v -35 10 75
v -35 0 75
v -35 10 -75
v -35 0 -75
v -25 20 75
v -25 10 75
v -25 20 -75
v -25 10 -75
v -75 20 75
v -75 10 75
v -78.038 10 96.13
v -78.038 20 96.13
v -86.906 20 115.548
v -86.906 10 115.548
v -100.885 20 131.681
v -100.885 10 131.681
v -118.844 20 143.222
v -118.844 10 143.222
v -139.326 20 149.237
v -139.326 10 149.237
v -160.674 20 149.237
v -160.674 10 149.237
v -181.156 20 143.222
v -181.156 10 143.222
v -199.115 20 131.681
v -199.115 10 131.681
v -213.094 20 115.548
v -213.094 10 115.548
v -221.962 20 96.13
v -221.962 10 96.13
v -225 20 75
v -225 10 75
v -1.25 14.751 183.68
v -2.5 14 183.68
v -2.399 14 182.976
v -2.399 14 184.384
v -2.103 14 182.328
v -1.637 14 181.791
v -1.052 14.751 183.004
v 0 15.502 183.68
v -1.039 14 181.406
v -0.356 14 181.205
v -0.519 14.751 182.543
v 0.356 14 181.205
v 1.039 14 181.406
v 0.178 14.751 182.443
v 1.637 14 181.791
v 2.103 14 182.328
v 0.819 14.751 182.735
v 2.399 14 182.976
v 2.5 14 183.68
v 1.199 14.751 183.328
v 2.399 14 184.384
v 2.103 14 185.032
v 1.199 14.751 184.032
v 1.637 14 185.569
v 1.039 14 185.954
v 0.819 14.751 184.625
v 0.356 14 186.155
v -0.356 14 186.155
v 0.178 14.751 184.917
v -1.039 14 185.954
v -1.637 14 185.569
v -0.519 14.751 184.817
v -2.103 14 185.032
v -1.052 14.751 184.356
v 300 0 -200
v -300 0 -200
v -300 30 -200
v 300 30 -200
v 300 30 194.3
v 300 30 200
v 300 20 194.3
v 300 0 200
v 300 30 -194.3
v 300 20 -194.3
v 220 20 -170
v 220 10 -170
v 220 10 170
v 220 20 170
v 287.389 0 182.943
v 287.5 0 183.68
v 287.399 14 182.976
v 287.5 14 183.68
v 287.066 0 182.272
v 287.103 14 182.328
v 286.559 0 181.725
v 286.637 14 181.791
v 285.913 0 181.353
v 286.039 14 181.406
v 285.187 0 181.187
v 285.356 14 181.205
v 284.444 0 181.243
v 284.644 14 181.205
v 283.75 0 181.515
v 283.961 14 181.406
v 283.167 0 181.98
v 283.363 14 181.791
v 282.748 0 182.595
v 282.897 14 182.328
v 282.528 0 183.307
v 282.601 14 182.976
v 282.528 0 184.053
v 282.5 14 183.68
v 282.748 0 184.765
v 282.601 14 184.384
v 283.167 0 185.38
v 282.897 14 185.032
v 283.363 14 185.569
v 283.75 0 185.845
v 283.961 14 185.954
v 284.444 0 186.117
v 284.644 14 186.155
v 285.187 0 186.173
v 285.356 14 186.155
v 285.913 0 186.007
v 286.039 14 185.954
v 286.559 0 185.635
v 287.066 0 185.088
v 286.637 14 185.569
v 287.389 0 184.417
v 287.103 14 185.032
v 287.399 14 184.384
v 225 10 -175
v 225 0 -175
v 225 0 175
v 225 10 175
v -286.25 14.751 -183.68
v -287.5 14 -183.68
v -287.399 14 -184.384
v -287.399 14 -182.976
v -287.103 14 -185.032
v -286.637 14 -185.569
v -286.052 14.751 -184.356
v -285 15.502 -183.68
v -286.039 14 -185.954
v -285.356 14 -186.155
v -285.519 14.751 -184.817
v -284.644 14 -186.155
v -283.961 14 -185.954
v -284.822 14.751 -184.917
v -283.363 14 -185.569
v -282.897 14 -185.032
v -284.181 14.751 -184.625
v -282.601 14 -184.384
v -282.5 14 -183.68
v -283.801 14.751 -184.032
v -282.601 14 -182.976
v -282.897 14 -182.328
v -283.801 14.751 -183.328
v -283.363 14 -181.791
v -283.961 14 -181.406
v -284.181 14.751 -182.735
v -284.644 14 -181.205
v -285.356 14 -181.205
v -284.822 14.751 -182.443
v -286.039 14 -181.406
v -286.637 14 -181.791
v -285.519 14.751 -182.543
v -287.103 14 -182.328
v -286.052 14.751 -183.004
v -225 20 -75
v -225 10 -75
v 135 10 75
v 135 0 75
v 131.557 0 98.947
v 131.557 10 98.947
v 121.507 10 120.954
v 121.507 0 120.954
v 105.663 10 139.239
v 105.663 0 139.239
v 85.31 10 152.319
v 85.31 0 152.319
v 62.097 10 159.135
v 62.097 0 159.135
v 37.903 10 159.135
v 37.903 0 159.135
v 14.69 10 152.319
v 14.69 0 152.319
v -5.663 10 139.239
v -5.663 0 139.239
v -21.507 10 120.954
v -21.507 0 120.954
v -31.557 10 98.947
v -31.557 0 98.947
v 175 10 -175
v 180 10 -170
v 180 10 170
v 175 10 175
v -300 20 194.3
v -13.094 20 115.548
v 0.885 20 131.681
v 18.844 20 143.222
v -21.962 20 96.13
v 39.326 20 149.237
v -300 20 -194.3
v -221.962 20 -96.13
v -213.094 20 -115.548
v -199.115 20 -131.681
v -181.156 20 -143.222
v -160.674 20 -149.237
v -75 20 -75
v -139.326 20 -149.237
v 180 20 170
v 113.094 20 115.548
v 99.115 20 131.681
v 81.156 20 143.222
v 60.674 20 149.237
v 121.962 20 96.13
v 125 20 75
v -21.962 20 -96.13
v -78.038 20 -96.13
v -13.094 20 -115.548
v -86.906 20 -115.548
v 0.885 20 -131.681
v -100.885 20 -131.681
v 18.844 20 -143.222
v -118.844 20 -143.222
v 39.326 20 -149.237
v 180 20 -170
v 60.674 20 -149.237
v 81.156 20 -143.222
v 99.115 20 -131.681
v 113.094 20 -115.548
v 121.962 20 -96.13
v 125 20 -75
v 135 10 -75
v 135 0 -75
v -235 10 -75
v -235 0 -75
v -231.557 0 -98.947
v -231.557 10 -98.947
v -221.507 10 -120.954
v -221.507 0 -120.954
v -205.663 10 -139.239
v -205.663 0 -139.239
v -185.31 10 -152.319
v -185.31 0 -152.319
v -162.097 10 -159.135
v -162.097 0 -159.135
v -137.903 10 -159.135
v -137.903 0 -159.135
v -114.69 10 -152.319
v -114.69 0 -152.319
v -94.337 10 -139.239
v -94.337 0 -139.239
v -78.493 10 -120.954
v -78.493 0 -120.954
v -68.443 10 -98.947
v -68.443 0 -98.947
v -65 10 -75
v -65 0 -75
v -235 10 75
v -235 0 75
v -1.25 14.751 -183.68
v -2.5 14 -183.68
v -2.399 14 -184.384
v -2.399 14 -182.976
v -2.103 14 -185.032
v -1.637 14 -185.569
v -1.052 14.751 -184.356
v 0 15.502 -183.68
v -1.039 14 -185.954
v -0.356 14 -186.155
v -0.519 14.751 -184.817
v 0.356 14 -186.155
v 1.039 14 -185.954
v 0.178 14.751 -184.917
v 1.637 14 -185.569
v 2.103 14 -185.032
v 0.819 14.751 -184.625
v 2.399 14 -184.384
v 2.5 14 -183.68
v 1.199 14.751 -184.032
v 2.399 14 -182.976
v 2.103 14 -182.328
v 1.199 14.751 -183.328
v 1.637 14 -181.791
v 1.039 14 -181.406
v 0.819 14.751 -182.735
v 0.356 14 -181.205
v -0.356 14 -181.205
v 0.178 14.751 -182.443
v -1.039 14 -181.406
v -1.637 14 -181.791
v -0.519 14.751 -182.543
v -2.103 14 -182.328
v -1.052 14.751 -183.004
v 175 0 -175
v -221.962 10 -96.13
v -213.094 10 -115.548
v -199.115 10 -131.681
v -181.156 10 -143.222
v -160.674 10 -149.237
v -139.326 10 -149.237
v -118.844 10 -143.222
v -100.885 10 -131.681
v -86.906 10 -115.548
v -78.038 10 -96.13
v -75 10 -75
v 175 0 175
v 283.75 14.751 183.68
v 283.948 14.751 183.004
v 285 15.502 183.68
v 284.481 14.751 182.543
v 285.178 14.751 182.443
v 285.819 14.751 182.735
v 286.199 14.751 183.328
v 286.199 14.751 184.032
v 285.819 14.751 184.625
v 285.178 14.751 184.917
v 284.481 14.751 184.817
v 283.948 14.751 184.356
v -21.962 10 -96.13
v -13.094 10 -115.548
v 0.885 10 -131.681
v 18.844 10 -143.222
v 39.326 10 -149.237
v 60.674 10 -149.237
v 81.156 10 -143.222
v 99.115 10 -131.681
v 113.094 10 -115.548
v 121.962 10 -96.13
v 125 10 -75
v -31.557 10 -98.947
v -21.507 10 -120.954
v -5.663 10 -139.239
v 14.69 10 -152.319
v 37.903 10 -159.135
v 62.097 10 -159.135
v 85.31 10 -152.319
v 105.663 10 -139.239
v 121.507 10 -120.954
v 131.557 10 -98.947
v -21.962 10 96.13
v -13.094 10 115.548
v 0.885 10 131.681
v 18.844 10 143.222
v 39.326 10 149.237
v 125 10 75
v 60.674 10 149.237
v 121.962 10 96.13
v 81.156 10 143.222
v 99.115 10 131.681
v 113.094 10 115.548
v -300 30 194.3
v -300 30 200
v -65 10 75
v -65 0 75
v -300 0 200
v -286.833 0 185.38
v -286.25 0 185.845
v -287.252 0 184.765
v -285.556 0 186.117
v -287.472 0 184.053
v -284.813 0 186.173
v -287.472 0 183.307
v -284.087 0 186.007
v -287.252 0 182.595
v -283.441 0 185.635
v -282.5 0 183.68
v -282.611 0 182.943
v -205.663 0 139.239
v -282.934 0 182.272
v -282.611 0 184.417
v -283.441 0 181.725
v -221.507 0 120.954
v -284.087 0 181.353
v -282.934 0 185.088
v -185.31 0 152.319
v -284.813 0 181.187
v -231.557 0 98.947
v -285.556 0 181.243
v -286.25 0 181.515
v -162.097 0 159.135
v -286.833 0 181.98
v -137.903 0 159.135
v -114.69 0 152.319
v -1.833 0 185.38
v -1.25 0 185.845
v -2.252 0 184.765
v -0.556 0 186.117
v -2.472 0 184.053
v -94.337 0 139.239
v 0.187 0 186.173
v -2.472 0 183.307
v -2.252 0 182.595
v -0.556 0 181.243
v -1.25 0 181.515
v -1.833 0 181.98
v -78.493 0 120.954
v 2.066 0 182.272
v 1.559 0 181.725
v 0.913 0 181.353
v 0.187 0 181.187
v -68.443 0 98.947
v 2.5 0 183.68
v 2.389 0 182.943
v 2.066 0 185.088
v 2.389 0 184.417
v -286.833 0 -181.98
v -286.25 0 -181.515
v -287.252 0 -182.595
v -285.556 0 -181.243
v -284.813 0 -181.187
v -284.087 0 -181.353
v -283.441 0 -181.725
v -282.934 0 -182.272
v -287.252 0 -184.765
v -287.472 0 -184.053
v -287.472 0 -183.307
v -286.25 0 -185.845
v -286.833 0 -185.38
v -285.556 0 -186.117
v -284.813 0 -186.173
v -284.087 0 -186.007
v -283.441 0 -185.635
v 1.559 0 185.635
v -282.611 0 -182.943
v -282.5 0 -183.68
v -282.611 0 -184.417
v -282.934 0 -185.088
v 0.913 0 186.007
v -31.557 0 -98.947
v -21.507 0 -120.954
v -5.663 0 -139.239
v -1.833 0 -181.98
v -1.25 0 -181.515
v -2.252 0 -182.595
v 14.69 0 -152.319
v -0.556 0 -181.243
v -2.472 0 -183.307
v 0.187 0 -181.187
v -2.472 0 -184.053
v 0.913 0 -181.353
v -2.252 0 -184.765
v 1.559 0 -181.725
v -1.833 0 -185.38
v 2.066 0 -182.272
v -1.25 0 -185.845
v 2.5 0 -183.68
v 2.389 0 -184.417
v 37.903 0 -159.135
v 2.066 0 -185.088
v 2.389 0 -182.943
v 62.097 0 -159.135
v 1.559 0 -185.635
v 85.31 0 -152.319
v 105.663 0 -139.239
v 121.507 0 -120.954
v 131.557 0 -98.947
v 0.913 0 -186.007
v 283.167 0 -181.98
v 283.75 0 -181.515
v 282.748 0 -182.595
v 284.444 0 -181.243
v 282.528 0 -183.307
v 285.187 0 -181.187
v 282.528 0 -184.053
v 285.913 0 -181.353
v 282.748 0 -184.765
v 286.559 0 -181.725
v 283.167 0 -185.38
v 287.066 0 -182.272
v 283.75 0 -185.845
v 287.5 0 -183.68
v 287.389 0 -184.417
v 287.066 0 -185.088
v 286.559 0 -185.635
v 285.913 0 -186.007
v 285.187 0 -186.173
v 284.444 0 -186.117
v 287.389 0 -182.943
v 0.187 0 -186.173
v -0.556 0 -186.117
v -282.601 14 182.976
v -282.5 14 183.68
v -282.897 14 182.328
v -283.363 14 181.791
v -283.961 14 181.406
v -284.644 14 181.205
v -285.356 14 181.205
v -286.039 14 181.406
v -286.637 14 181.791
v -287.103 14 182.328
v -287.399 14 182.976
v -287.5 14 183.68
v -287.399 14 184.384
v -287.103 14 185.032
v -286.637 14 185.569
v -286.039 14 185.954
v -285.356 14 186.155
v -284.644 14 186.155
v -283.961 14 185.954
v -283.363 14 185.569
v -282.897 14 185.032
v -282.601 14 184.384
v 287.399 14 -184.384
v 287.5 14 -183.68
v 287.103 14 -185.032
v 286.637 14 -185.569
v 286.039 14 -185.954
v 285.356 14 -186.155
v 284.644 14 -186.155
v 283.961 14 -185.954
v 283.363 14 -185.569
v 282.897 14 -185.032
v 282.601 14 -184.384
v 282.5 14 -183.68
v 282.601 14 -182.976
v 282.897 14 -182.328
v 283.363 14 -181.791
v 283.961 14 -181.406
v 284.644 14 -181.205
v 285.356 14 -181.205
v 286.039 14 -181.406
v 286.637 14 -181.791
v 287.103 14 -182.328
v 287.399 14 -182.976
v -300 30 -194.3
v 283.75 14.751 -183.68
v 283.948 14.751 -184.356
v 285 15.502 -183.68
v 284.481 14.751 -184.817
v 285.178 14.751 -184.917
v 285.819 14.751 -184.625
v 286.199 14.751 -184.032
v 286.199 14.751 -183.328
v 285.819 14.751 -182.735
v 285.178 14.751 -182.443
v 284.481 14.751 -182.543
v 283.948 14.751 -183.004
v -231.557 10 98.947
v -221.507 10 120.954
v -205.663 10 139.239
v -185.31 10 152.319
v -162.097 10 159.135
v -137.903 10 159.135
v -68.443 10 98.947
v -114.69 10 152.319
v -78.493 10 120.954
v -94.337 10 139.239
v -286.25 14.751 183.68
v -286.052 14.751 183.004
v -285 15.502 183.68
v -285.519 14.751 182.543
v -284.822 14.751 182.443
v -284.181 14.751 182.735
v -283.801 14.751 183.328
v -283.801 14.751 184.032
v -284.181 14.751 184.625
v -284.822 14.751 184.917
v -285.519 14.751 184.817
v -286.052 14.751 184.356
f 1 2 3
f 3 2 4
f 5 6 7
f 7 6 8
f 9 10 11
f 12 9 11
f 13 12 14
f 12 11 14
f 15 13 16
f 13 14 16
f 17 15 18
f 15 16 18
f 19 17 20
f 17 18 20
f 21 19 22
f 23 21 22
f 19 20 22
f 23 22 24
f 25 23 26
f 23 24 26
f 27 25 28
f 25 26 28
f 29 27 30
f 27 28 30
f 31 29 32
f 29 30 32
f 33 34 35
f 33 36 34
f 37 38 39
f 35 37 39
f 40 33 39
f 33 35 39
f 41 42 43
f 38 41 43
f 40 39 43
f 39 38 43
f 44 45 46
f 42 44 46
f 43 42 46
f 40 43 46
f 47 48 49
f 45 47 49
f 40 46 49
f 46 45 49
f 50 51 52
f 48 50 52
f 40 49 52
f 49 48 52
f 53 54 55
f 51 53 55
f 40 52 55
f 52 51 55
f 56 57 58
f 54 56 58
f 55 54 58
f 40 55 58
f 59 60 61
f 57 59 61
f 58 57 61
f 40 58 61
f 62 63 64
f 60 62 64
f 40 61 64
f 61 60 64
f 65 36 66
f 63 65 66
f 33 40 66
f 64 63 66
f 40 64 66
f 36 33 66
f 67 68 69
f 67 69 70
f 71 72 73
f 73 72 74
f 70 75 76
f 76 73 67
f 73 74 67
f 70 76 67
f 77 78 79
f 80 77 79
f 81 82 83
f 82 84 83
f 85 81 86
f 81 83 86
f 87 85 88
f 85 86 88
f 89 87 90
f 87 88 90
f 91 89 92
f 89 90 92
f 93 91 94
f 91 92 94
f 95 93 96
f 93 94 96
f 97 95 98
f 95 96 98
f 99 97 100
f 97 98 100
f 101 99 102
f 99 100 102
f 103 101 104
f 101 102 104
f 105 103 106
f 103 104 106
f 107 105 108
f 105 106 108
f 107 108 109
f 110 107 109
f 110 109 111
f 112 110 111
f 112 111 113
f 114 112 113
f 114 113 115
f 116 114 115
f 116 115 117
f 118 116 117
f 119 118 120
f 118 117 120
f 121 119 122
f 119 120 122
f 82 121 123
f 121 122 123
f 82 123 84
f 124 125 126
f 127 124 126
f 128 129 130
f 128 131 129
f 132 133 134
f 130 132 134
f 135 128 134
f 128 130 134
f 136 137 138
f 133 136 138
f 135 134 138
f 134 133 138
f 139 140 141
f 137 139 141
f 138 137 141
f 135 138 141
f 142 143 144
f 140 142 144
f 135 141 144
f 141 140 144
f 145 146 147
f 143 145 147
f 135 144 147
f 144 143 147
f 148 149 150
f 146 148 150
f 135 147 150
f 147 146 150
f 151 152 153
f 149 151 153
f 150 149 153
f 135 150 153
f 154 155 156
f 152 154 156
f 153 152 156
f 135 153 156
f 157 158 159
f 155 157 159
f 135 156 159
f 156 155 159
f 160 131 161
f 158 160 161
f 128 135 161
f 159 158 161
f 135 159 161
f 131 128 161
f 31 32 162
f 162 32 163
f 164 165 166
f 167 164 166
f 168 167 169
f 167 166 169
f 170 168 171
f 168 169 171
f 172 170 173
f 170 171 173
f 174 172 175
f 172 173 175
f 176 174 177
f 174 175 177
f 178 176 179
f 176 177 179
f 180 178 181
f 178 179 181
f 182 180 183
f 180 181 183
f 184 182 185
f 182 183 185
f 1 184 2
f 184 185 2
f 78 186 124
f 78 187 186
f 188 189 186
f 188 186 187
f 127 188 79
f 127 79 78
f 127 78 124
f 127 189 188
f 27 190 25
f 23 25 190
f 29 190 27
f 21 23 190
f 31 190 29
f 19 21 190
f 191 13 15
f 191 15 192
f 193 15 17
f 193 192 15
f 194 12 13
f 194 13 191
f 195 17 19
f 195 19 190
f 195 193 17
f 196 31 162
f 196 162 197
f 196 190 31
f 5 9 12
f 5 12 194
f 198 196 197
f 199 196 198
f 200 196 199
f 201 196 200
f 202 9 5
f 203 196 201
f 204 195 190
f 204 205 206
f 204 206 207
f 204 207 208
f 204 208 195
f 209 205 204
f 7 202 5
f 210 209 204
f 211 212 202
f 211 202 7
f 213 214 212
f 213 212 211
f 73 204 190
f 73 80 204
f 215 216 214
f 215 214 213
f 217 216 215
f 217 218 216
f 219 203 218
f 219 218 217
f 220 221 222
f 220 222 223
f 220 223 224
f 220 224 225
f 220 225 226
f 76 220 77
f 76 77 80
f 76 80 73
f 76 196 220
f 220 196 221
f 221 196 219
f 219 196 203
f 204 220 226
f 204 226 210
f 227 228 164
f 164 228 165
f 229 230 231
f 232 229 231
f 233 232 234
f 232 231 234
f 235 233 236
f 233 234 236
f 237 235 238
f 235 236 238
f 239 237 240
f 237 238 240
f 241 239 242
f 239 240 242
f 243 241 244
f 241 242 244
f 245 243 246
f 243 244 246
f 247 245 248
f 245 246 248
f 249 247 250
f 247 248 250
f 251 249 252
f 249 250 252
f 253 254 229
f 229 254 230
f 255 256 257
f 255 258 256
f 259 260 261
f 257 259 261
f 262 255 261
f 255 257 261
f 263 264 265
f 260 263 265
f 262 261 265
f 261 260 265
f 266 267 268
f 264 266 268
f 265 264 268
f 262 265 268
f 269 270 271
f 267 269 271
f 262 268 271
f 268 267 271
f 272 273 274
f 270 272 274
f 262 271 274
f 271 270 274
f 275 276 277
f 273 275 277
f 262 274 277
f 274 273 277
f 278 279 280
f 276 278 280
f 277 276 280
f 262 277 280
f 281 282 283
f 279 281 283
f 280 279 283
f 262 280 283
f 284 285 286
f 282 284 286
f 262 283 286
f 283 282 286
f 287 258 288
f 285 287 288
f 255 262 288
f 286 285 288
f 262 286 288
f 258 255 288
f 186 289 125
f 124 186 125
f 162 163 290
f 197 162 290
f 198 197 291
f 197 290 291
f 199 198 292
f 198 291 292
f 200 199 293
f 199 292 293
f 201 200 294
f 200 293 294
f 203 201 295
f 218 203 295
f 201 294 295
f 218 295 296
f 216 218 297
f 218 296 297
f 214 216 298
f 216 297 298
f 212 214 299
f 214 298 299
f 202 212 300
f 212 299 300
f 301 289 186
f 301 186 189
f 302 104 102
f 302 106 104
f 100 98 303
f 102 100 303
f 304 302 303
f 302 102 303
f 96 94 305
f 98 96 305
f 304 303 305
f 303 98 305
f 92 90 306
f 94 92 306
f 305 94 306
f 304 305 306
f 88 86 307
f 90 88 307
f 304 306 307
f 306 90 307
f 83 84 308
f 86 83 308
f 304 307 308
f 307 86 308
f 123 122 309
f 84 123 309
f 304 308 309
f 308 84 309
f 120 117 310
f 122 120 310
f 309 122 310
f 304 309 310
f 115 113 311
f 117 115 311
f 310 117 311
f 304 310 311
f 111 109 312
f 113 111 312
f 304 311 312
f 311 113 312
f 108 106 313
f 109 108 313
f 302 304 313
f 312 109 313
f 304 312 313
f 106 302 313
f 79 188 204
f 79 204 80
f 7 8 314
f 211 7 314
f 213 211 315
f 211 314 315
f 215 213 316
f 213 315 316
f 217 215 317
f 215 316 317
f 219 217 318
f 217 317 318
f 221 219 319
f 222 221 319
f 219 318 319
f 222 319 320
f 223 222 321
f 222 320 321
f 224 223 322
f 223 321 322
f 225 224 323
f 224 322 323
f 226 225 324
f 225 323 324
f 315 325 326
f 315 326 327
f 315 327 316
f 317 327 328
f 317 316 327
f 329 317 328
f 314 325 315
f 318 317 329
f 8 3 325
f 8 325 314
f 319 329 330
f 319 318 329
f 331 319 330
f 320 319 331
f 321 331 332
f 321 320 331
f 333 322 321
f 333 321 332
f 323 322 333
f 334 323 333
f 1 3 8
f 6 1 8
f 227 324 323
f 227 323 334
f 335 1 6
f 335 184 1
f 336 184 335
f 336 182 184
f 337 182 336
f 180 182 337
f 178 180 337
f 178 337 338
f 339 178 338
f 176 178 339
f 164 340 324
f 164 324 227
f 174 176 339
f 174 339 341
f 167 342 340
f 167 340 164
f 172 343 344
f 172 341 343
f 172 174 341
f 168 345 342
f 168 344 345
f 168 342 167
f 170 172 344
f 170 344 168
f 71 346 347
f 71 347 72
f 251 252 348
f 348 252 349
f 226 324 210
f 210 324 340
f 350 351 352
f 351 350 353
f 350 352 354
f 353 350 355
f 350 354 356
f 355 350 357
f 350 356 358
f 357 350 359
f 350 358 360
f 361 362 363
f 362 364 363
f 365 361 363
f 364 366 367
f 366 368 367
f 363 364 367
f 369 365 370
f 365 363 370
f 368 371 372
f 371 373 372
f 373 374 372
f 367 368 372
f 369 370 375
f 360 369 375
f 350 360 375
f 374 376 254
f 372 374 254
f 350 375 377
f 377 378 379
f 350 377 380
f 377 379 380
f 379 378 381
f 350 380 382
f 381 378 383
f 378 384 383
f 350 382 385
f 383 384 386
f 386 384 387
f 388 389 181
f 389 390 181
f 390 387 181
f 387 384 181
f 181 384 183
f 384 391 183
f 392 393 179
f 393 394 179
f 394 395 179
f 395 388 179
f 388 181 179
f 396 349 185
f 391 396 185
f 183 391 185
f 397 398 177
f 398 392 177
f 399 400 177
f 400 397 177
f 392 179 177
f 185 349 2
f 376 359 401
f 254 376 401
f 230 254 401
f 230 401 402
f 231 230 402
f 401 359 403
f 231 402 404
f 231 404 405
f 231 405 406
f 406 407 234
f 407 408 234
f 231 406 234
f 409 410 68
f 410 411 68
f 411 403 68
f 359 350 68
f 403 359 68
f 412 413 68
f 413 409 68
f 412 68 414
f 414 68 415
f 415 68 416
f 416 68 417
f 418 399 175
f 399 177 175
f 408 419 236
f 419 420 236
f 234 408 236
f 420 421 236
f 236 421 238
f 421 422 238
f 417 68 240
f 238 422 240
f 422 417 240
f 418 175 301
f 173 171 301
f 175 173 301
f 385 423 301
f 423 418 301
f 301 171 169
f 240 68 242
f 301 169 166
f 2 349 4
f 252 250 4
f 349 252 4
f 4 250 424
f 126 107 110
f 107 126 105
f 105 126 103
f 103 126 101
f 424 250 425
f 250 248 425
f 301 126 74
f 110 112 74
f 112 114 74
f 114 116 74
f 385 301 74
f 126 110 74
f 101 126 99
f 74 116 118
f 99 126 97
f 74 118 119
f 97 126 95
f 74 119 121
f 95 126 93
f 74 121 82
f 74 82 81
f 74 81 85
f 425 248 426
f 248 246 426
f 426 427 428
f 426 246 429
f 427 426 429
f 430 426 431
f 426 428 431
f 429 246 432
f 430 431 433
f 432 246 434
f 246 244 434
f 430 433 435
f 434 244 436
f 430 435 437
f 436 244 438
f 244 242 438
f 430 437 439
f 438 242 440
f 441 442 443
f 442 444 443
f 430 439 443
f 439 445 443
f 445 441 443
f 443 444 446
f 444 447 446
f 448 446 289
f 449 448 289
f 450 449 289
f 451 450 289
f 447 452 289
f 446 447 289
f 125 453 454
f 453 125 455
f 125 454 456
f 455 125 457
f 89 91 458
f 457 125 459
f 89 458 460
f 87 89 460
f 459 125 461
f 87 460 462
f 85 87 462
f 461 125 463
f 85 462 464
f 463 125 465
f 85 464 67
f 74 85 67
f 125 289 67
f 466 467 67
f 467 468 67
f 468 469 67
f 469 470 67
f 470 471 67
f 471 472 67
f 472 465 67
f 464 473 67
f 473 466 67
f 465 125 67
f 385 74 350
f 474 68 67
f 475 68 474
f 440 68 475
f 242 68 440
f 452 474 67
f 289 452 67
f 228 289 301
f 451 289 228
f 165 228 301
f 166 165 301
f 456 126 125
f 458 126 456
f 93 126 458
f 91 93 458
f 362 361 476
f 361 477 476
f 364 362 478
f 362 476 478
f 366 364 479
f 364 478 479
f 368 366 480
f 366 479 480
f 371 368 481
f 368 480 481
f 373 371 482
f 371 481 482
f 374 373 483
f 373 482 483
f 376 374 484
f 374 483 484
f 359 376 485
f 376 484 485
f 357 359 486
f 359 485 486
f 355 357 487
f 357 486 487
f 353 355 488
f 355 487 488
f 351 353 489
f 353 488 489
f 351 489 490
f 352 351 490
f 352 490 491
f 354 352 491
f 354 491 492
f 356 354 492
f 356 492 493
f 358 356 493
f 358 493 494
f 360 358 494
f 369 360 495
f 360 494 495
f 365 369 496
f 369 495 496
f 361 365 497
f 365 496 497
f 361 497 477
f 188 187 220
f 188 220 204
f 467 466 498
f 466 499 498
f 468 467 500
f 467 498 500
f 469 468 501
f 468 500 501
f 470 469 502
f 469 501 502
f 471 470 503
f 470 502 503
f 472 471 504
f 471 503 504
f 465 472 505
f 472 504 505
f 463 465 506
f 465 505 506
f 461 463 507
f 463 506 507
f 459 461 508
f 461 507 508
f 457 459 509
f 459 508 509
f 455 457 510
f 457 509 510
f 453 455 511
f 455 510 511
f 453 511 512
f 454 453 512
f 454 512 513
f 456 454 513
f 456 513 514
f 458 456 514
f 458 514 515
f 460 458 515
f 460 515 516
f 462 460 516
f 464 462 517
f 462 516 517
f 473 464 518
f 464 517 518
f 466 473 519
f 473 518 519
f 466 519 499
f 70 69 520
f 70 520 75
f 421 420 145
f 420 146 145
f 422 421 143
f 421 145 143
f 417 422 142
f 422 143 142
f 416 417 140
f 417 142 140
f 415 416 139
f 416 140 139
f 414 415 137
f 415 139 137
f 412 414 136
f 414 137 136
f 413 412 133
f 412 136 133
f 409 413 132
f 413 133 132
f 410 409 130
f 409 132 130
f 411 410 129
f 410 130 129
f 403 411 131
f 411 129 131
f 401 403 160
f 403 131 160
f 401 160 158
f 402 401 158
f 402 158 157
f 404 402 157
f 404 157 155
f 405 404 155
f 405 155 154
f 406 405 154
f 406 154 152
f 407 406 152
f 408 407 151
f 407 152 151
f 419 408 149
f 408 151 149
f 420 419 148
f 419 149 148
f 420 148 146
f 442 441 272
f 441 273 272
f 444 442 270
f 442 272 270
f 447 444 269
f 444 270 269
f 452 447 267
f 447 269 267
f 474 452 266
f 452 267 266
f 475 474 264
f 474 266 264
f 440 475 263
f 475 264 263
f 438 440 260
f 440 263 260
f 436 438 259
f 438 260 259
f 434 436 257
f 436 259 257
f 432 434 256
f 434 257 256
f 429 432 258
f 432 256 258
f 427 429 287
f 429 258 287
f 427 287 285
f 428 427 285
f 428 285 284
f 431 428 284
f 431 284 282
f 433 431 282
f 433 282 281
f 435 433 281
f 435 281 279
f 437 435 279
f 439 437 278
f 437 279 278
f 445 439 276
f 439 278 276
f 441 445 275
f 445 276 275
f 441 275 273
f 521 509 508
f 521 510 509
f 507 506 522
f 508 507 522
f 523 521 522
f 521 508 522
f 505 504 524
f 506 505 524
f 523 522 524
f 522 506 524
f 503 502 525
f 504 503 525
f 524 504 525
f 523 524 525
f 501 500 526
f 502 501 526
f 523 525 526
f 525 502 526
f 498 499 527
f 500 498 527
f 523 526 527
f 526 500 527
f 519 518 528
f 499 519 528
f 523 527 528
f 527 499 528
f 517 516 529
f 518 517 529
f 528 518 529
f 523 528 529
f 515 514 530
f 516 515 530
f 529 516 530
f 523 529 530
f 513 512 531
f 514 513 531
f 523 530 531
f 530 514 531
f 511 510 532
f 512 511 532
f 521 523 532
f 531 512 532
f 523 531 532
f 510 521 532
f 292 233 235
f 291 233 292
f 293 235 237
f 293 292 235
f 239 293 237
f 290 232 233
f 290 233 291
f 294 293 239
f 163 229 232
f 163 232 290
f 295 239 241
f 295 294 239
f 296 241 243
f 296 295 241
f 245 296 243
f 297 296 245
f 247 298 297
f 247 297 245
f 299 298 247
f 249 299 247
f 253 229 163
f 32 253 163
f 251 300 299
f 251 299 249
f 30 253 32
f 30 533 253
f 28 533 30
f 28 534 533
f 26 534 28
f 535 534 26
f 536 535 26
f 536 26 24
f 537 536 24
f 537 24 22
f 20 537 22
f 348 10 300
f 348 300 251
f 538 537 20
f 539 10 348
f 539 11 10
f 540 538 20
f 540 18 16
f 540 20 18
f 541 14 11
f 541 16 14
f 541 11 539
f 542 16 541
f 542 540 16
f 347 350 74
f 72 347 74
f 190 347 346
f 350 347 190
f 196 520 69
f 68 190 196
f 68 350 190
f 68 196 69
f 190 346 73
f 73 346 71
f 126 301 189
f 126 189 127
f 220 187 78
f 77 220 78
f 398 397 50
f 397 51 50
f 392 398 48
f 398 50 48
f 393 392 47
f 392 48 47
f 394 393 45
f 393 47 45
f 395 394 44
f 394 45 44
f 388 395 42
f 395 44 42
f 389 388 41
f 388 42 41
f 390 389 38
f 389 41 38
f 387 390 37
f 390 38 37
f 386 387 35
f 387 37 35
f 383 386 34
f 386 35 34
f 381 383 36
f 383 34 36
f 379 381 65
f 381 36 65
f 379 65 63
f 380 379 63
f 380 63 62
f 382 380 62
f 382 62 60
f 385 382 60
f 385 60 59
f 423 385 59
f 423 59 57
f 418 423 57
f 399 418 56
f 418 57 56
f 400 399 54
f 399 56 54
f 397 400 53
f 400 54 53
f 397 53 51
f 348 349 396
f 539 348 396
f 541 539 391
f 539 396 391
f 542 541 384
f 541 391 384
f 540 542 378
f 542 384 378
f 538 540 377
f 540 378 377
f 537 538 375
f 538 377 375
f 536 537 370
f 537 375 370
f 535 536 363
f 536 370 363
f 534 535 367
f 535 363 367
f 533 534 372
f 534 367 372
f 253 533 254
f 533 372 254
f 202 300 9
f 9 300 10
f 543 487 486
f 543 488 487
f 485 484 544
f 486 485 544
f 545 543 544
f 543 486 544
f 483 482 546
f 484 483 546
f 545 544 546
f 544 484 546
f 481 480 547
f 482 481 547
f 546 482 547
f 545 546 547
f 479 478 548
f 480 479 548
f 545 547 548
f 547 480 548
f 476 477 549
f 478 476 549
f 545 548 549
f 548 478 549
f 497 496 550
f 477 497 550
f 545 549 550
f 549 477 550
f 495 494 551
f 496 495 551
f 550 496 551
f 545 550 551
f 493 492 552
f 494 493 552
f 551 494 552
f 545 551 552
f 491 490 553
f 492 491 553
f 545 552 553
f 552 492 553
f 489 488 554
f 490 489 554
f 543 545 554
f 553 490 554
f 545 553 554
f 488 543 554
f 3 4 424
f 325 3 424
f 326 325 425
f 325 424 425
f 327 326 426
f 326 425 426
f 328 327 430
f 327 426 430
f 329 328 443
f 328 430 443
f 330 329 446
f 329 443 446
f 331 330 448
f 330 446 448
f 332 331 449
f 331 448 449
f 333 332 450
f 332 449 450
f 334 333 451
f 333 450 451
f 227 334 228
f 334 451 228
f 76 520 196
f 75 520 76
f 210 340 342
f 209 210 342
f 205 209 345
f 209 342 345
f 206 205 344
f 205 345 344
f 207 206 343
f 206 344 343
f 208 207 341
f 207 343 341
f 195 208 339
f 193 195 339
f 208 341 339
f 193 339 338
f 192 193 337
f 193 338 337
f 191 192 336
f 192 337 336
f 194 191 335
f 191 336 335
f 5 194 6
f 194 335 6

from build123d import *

# Parameters (mm, degrees)
SKETCH_1_W             = 600
SKETCH_1_H             = 400
EXTRUDE_1_DEPTH        = 30
SKETCH_2_W             = 600
SKETCH_2_H             = 388.6
CUT_EXTRUDE_1_DEPTH    = 10
SKETCH_3_W             = 50
SKETCH_3_H             = 350
CUT_EXTRUDE_2_DEPTH    = 10
SKETCH_4_W             = 40
SKETCH_4_H             = 340
CUT_EXTRUDE_3_DEPTH    = 10
HOLE_WIZARD_M6_1_D     = 5
HOLE_WIZARD_M6_1_DEPTH = 14
HOLE_WIZARD_M6_1_TIP   = 1.502151548


with BuildPart() as part:
    # 草图1 → 凸台-拉伸1 (new body)
    with BuildSketch(Plane(origin=(0, 0, 0), x_dir=(1, 0, 0), z_dir=(0, 1, 0))):
        Rectangle(SKETCH_1_W, SKETCH_1_H)
    extrude(amount=EXTRUDE_1_DEPTH)

    # 草图2 → 切除-拉伸1 (cut)
    with BuildSketch(Plane(origin=(0, 30, 0), x_dir=(1, 0, 0), z_dir=(0, 1, 0))):
        Rectangle(SKETCH_2_W, SKETCH_2_H)
    extrude(amount=-CUT_EXTRUDE_1_DEPTH, mode=Mode.SUBTRACT)

    # 草图3 → 切除-拉伸2 (cut)
    with BuildSketch(Plane.XZ):
        with Locations((200, 0)):
            Rectangle(SKETCH_3_W, SKETCH_3_H)
        with BuildLine():
            Line((-235, 75), (-235, -75))
            ThreePointArc((-235, -75), (-150, -160), (-65, -75))
            Line((-65, -75), (-65, 75))
            ThreePointArc((-65, 75), (-150, 160), (-235, 75))
        make_face()
        with BuildLine():
            Line((-35, 75), (-35, -75))
            ThreePointArc((-35, -75), (50, -160), (135, -75))
            Line((135, -75), (135, 75))
            ThreePointArc((135, 75), (50, 160), (-35, 75))
        make_face()
    extrude(amount=-CUT_EXTRUDE_2_DEPTH, mode=Mode.SUBTRACT)

    # 草图4 → 切除-拉伸3 (cut)
    with BuildSketch(Plane.XZ.offset(-10)):
        with Locations((200, 0)):
            Rectangle(SKETCH_4_W, SKETCH_4_H)
        with BuildLine():
            Line((-225, 75), (-225, -75))
            ThreePointArc((-225, -75), (-150, -150), (-75, -75))
            Line((-75, -75), (-75, 75))
            ThreePointArc((-75, 75), (-150, 150), (-225, 75))
        make_face()
        with BuildLine():
            Line((-25, 75), (-25, -75))
            ThreePointArc((-25, -75), (50, -150), (125, -75))
            Line((125, -75), (125, 75))
            ThreePointArc((125, 75), (50, 150), (-25, 75))
        make_face()
    extrude(amount=-CUT_EXTRUDE_3_DEPTH, mode=Mode.SUBTRACT)

    # M6 螺纹孔1
    with Locations(Plane(origin=(0, 0, 0), x_dir=(-1, 0, 0), z_dir=(0, -1, 0))):
        with Locations((285, -183.68), (0, -183.68), (-285, -183.68), (-285, 183.68), (0, 183.68), (285, 183.68)):
            Hole(HOLE_WIZARD_M6_1_D / 2, depth=HOLE_WIZARD_M6_1_DEPTH)
            with Locations((0, 0, -(HOLE_WIZARD_M6_1_DEPTH + HOLE_WIZARD_M6_1_TIP / 2))):  # 118° drill point
                Cone(0, HOLE_WIZARD_M6_1_D / 2, HOLE_WIZARD_M6_1_TIP, mode=Mode.SUBTRACT)


solid = part.part
